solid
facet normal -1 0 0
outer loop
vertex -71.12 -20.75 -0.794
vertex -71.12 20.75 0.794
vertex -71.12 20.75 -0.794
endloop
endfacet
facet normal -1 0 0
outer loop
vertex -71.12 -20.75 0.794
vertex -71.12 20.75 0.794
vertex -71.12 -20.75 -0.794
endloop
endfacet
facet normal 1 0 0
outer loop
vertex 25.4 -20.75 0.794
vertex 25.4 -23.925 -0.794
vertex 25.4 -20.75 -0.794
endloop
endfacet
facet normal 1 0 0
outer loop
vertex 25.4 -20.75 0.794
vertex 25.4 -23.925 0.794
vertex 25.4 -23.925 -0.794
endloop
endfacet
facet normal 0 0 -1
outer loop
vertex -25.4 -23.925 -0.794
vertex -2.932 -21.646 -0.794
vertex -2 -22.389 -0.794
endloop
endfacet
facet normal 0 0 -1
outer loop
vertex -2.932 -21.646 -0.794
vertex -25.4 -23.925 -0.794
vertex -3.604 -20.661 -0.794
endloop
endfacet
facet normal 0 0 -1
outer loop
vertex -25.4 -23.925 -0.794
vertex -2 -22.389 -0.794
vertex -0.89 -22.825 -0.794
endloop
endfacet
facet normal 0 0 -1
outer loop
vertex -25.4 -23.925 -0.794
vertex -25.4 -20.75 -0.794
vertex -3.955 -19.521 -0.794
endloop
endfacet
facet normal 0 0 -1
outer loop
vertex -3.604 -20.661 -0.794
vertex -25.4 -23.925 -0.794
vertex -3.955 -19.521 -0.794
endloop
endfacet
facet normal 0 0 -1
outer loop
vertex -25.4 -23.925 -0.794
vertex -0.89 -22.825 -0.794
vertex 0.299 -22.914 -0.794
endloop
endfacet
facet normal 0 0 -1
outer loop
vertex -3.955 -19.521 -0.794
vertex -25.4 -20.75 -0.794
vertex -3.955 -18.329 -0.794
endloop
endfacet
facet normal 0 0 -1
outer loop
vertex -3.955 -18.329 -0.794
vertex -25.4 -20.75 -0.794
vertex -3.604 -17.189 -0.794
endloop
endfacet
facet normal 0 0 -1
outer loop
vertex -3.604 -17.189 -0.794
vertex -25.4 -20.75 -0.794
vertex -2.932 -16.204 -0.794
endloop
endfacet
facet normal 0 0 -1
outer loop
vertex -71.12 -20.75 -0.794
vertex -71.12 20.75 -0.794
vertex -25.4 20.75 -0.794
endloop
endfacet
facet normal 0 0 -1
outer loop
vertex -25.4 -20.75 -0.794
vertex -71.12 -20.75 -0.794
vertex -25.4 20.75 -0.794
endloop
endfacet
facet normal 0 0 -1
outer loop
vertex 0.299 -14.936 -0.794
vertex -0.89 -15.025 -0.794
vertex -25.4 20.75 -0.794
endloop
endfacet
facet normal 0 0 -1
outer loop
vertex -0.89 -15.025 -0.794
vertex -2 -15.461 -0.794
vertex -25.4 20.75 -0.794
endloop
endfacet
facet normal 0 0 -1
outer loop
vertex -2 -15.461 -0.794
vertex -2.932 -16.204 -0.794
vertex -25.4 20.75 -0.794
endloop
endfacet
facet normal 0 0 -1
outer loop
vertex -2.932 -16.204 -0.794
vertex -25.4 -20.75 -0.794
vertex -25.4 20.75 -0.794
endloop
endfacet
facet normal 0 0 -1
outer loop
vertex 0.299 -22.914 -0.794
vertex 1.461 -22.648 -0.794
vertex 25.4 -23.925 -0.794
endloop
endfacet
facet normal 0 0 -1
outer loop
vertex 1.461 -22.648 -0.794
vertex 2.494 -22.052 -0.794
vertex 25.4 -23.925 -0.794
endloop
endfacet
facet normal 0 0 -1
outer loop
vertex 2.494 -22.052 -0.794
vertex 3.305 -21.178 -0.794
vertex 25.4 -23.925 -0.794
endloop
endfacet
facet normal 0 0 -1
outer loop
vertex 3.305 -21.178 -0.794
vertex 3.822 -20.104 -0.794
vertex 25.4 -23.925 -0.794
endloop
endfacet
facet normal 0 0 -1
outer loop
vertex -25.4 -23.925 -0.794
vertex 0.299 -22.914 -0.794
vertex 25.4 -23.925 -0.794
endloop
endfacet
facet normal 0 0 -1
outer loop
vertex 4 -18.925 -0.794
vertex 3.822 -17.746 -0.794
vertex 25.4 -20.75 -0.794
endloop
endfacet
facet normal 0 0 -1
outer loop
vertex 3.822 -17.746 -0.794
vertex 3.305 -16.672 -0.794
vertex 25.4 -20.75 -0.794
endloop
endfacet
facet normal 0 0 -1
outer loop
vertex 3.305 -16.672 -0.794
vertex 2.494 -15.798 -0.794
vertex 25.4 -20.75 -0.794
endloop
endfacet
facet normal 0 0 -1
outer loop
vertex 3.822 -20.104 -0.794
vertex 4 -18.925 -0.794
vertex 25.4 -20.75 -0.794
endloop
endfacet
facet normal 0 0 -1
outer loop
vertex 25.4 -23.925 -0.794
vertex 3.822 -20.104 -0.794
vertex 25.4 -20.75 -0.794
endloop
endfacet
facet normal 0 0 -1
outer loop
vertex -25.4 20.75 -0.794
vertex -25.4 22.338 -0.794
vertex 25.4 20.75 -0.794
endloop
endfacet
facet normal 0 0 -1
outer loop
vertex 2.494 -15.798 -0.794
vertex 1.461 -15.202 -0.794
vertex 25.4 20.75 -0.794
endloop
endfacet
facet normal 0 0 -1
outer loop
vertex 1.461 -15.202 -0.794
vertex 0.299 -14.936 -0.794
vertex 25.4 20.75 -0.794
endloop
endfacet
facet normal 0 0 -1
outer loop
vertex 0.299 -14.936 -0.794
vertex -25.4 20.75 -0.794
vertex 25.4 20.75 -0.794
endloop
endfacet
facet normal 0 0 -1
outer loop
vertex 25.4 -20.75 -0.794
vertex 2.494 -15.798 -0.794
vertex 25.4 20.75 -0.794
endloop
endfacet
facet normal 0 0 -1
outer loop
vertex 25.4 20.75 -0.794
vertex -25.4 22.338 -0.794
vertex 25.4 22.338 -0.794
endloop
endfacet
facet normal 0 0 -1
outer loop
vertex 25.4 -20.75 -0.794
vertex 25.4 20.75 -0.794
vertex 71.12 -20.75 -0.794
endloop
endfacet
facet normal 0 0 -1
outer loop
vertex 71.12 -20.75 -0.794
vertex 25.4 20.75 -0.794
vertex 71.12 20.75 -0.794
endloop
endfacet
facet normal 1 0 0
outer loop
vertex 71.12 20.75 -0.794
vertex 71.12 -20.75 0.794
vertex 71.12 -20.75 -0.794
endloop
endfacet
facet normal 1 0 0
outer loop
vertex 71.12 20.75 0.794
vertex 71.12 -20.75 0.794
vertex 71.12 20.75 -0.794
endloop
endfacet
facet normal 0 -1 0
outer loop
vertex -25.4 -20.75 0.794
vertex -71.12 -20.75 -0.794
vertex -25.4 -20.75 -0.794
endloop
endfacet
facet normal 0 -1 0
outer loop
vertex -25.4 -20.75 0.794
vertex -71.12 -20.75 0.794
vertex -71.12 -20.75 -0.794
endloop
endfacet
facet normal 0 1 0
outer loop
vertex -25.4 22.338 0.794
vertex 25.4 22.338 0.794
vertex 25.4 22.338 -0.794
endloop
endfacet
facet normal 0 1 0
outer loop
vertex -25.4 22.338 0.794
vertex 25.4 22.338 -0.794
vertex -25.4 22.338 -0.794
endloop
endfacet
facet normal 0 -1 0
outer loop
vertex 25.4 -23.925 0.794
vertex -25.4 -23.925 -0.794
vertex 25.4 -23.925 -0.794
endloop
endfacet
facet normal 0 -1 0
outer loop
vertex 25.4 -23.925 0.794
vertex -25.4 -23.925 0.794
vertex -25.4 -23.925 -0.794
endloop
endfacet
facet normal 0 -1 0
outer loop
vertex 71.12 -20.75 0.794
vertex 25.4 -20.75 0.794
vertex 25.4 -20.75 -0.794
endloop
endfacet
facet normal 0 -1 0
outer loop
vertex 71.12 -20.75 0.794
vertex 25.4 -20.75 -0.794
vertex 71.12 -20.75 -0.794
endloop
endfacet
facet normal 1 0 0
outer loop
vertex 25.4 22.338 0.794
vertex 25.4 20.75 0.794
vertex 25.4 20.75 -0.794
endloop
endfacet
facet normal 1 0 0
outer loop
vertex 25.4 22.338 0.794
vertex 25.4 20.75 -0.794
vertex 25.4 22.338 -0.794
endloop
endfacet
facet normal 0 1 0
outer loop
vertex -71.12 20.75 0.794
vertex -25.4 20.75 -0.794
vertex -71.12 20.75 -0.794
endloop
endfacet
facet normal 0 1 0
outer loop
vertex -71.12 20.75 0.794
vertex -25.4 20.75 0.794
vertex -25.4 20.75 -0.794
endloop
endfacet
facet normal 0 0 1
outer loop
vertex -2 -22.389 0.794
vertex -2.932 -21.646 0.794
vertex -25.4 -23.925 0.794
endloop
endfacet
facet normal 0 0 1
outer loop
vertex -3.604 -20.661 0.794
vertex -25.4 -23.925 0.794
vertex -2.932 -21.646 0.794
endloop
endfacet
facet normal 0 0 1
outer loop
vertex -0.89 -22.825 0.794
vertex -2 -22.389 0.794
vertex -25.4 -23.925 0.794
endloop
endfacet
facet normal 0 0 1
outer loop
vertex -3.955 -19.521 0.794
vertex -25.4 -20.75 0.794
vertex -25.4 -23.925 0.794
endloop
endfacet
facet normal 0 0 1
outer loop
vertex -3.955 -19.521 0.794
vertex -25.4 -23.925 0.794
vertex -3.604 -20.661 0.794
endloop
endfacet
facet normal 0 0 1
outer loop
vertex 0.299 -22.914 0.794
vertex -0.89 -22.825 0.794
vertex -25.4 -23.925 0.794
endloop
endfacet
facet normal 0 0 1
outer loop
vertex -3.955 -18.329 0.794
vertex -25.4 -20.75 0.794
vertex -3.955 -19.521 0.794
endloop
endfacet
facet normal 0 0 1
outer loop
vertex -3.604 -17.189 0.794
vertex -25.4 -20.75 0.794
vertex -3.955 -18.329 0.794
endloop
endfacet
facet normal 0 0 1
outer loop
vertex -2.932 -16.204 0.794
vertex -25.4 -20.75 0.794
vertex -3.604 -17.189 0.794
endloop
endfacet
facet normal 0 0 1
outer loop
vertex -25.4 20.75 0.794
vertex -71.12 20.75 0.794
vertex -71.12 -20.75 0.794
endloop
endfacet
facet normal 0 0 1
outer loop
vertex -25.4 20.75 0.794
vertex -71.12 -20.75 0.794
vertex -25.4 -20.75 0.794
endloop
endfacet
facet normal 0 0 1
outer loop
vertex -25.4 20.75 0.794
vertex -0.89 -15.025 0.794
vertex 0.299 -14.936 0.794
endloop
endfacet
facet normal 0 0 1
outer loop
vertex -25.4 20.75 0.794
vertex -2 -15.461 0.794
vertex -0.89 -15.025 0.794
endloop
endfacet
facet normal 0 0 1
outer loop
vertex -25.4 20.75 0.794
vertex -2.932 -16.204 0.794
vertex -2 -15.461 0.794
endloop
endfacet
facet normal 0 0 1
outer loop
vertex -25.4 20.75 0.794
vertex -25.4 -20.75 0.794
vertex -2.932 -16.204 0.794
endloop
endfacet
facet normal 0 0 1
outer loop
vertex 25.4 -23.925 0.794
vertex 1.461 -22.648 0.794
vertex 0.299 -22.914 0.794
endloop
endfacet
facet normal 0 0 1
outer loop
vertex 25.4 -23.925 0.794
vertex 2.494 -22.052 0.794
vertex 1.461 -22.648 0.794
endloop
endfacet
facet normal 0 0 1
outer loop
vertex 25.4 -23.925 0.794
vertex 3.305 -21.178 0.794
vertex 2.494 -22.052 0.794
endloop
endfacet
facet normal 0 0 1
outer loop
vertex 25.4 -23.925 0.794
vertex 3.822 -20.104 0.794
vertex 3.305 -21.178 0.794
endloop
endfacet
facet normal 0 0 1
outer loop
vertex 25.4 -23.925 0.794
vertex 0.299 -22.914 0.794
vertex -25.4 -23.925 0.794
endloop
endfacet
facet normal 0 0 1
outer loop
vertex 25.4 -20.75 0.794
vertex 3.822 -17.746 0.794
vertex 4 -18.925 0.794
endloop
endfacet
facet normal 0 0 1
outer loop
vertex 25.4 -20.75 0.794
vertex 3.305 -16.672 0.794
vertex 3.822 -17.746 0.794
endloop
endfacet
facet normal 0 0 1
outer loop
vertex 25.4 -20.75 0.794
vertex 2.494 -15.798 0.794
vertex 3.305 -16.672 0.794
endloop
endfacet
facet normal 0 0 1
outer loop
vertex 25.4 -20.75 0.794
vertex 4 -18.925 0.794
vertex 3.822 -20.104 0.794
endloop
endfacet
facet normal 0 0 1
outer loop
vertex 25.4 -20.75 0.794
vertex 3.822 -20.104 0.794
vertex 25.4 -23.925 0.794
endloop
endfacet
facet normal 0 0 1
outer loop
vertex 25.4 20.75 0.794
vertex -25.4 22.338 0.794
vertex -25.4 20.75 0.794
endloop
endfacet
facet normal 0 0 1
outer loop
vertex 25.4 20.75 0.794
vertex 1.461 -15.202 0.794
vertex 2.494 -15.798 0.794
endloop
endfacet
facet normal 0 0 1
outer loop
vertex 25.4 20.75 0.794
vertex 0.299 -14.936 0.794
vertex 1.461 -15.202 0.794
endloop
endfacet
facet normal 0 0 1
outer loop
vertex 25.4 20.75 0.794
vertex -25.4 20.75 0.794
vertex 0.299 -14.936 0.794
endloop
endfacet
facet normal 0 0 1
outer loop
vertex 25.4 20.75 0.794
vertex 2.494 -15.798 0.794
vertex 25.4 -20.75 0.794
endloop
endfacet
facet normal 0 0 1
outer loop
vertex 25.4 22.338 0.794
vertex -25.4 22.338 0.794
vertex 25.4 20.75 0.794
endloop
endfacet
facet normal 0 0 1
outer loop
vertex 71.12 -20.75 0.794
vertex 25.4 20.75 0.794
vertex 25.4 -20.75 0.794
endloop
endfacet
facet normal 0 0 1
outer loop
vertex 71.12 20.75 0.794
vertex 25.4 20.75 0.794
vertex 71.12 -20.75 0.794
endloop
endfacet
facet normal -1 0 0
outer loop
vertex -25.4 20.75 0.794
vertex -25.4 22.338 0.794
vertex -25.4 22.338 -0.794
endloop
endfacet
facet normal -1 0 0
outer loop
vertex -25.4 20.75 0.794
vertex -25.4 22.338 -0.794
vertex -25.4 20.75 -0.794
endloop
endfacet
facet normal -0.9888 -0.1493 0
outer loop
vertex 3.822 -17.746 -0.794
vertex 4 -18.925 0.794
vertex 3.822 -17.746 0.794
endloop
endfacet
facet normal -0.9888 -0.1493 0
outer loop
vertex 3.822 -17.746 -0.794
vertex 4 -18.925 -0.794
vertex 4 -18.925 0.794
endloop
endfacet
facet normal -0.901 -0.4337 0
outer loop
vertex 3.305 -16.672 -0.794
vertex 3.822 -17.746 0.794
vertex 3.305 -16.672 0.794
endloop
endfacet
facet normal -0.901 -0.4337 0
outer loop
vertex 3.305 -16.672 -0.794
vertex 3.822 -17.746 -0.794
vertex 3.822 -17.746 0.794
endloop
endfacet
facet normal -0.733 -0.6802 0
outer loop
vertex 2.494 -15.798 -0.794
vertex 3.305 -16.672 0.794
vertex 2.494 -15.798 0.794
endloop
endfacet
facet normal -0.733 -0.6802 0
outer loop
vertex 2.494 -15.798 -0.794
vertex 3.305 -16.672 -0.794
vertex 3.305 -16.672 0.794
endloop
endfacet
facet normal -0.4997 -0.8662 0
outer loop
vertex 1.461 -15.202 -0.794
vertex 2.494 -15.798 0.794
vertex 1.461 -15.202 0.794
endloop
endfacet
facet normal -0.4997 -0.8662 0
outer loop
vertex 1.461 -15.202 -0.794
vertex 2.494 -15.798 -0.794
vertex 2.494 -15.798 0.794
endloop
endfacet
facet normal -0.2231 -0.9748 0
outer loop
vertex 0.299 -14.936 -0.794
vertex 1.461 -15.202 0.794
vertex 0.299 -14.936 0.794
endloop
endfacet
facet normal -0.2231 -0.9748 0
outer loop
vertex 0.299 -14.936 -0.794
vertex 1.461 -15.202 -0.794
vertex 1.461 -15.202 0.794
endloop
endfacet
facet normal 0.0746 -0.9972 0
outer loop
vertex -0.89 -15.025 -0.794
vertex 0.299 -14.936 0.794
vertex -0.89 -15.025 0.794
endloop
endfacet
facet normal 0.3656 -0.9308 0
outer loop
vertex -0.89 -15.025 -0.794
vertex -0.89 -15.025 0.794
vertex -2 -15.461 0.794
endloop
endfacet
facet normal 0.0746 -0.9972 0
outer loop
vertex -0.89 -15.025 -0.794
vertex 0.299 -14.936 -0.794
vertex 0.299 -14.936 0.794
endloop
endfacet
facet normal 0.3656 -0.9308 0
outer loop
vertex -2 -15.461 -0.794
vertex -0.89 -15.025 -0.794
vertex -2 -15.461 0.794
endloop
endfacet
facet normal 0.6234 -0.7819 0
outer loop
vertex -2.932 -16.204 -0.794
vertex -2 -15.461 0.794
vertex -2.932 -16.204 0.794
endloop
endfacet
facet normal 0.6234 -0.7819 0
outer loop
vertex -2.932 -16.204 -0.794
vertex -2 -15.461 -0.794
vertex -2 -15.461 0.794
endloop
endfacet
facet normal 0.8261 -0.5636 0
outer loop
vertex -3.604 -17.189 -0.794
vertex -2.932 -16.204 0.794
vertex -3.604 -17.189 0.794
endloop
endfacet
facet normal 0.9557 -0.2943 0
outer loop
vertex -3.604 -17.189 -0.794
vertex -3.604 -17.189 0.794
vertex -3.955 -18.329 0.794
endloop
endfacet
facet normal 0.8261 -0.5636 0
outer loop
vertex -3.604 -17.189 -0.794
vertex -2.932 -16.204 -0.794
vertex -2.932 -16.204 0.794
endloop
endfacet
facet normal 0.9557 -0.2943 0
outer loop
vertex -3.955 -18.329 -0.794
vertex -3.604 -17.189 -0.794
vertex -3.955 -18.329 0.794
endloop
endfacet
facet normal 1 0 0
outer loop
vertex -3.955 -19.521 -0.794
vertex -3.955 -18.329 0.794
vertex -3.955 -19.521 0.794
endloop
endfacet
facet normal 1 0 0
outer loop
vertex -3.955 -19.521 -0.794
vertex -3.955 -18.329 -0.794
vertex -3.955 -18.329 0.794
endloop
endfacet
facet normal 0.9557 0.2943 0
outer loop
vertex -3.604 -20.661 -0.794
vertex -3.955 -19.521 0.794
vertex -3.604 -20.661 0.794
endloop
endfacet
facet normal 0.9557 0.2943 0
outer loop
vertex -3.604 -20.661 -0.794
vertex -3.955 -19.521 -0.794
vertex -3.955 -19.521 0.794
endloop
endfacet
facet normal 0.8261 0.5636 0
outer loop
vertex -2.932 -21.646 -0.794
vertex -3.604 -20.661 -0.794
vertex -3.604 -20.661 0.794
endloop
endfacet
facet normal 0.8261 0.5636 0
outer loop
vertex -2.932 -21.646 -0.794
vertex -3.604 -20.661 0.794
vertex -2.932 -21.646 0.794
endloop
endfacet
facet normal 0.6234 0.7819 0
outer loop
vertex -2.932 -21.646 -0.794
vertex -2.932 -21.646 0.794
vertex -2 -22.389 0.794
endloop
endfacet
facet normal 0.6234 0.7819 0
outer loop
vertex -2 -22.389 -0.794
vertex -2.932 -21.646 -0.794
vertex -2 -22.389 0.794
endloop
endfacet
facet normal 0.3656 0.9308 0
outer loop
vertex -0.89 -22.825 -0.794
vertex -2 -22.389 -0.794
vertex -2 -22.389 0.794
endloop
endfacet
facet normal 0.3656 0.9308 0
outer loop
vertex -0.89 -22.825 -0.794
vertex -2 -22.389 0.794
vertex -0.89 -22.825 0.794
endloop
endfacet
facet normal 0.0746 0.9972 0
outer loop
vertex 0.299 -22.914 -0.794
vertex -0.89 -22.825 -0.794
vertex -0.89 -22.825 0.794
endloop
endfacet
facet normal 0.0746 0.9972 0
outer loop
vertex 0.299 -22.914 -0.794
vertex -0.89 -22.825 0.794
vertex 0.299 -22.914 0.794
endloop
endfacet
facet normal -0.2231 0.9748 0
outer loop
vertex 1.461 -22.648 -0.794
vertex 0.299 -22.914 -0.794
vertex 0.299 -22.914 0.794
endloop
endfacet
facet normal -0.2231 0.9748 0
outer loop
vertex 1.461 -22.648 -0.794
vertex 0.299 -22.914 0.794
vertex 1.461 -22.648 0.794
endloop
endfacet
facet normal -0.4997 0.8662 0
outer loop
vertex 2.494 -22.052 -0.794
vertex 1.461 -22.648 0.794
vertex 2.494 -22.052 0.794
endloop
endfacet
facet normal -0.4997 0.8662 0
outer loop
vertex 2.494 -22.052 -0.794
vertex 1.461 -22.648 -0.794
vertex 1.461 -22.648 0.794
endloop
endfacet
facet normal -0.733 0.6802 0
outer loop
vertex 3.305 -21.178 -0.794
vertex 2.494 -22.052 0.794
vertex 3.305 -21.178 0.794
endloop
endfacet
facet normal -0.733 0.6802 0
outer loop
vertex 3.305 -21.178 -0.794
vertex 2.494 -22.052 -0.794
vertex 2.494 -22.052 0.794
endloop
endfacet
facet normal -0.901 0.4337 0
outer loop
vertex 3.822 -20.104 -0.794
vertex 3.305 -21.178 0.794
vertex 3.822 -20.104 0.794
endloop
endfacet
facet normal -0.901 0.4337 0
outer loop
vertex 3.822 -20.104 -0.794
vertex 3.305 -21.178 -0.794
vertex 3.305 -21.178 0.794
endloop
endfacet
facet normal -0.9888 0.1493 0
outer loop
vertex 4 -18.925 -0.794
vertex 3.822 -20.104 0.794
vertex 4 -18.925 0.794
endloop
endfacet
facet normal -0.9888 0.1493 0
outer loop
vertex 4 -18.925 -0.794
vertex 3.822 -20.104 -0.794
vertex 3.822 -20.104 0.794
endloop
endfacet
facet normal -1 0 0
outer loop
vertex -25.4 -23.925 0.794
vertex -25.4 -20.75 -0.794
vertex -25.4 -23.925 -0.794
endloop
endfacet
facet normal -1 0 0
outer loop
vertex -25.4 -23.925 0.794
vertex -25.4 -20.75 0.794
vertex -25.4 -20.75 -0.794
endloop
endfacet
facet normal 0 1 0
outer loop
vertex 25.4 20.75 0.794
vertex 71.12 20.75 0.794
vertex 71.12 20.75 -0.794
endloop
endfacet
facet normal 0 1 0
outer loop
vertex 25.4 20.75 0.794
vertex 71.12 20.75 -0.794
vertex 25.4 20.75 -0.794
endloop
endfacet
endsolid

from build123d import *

# Parameters (mm, degrees)
SKETCH1_R           = 4
BOSS_EXTRUDE1_DEPTH = 0.79375


with BuildPart() as part:
    # Sketch1 → Boss-Extrude1 (new body, symmetric)
    with BuildSketch(Plane.XY):
        Polygon((25.4, -23.925), (25.4, -20.75), (71.12, -20.75), (71.12, 20.75), (25.4, 20.75), (25.4, 22.3375), (-25.4, 22.3375), (-25.4, 20.75), (-71.12, 20.75), (-71.12, -20.75), (-25.4, -20.75), (-25.4, -23.925), align=None)
        with Locations((0, -18.925)):
            Circle(SKETCH1_R, mode=Mode.SUBTRACT)
    extrude(amount=BOSS_EXTRUDE1_DEPTH, both=True)


solid = part.part
